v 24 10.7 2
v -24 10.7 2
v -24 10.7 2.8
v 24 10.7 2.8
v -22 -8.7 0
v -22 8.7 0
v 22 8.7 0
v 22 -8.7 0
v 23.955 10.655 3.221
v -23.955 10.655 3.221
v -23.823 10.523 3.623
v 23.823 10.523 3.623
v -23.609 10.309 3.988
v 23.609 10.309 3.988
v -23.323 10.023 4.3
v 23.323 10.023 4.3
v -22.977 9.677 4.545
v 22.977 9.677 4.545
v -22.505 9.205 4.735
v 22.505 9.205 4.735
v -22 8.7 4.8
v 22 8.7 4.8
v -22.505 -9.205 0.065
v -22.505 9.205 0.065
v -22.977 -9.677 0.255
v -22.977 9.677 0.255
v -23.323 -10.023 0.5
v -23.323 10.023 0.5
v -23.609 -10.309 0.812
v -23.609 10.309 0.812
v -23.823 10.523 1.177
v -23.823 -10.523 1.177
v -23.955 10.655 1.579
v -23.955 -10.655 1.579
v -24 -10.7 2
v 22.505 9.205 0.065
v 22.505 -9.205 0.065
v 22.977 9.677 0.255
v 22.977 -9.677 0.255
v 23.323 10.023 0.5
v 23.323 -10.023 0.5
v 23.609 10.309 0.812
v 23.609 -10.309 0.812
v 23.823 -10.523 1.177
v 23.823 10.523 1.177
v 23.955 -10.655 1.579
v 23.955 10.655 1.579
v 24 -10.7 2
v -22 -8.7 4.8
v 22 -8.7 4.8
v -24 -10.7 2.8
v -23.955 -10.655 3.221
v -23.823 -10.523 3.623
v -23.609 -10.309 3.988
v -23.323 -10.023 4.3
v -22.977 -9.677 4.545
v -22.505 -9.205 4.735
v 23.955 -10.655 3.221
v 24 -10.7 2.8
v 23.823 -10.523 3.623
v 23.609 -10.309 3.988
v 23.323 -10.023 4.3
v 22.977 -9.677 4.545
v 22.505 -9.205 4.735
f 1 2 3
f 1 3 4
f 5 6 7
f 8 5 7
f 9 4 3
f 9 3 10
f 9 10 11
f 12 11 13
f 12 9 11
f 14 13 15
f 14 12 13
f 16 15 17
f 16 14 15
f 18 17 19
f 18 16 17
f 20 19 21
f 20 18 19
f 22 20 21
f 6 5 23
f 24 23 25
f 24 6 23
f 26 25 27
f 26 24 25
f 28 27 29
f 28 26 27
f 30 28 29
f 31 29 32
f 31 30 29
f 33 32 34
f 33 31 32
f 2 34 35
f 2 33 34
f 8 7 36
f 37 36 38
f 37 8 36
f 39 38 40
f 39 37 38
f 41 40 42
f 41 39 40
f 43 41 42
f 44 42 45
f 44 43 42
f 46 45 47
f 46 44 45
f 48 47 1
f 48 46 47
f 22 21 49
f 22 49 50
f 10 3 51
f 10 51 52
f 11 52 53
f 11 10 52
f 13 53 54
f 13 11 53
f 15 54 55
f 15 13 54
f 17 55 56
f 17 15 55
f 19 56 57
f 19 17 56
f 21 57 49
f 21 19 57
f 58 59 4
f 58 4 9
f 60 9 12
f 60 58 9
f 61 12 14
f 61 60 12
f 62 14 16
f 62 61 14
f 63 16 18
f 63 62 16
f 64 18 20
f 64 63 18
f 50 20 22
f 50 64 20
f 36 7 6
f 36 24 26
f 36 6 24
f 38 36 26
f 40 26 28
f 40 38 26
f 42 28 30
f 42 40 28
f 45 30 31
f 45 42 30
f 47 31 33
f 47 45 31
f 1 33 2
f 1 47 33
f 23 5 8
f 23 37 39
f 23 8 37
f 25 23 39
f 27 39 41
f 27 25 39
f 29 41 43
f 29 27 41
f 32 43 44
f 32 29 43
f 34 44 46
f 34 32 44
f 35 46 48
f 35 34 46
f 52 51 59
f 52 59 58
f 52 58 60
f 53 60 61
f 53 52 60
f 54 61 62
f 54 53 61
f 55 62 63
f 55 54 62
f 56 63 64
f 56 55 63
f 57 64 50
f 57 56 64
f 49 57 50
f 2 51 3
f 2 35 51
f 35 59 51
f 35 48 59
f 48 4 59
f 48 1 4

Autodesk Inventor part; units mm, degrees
ref_plane "YZ Plane" through (0, 0, 0) normal (1, 0, 0) x (0, 1, 0)
ref_plane "XZ Plane" through (0, 0, 0) normal (0, 1, 0) x (-1, 0, 0)
ref_plane "XY Plane" through (0, 0, 0) normal (0, 0, 1) x (1, 0, 0)
sketch "Sketch1" plane through (0, 0, 0) normal (0, 0, 1) x (1, 0, 0)
  line L0 (0, 14.98) -> (0, -14.98) construction
  line L1 (-33.6, 0) -> (33.6, 0) construction
  line L2 (24, -10.7) -> (-24, -10.7)
  line L3 (-24, -10.7) -> (-24, 10.7)
  line L4 (-24, 10.7) -> (24, 10.7)
  line L5 (24, 10.7) -> (24, -10.7)
  line L6 (24, -10.7) -> (-24, 10.7) construction
  line L7 (-24, -10.7) -> (24, 10.7) construction
  point P0 (0, 0)
  dimension "d0" = 21.4
  dimension "d1" = 48
extrude "Extrusion1" add sketch "Sketch1" along normal blind 4.8
fillet "Fillet1" radius 2 8 edges at (0, -10.7, 4.8) (0, -10.7, 0) (0, 10.7, 4.8) (0, 10.7, 0) (24, 0, 4.8) (24, 0, 0) (-24, 0, 0) (-24, 0, 4.8)
properties part number "3,.7V 500mAh"
